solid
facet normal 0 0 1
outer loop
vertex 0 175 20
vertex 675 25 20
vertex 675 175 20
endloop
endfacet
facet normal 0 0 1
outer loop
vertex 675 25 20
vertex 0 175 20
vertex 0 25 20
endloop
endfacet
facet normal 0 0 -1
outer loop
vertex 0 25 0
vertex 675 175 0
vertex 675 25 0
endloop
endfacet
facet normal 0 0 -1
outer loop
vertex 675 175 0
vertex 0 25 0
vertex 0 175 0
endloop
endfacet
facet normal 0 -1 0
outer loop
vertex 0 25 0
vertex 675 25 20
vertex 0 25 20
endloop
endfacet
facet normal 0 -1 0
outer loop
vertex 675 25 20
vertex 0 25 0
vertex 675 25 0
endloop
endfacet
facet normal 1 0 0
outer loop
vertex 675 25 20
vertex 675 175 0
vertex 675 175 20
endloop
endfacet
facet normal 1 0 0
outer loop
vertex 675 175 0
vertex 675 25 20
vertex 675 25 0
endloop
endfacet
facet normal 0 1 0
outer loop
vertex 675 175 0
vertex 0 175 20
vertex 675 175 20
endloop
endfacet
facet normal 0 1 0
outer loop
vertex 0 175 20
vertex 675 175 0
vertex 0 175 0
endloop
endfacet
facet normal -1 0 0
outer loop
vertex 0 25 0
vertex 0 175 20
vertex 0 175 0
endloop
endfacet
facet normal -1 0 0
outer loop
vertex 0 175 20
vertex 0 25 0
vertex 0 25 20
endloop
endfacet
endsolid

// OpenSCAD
linear_extrude(file = "nuvodia_plain.dxf", height = 40);
linear_extrude(file = "nuvodia_o.dxf", height =30);

translate([0,25,0])
cube([675,150,20]);
